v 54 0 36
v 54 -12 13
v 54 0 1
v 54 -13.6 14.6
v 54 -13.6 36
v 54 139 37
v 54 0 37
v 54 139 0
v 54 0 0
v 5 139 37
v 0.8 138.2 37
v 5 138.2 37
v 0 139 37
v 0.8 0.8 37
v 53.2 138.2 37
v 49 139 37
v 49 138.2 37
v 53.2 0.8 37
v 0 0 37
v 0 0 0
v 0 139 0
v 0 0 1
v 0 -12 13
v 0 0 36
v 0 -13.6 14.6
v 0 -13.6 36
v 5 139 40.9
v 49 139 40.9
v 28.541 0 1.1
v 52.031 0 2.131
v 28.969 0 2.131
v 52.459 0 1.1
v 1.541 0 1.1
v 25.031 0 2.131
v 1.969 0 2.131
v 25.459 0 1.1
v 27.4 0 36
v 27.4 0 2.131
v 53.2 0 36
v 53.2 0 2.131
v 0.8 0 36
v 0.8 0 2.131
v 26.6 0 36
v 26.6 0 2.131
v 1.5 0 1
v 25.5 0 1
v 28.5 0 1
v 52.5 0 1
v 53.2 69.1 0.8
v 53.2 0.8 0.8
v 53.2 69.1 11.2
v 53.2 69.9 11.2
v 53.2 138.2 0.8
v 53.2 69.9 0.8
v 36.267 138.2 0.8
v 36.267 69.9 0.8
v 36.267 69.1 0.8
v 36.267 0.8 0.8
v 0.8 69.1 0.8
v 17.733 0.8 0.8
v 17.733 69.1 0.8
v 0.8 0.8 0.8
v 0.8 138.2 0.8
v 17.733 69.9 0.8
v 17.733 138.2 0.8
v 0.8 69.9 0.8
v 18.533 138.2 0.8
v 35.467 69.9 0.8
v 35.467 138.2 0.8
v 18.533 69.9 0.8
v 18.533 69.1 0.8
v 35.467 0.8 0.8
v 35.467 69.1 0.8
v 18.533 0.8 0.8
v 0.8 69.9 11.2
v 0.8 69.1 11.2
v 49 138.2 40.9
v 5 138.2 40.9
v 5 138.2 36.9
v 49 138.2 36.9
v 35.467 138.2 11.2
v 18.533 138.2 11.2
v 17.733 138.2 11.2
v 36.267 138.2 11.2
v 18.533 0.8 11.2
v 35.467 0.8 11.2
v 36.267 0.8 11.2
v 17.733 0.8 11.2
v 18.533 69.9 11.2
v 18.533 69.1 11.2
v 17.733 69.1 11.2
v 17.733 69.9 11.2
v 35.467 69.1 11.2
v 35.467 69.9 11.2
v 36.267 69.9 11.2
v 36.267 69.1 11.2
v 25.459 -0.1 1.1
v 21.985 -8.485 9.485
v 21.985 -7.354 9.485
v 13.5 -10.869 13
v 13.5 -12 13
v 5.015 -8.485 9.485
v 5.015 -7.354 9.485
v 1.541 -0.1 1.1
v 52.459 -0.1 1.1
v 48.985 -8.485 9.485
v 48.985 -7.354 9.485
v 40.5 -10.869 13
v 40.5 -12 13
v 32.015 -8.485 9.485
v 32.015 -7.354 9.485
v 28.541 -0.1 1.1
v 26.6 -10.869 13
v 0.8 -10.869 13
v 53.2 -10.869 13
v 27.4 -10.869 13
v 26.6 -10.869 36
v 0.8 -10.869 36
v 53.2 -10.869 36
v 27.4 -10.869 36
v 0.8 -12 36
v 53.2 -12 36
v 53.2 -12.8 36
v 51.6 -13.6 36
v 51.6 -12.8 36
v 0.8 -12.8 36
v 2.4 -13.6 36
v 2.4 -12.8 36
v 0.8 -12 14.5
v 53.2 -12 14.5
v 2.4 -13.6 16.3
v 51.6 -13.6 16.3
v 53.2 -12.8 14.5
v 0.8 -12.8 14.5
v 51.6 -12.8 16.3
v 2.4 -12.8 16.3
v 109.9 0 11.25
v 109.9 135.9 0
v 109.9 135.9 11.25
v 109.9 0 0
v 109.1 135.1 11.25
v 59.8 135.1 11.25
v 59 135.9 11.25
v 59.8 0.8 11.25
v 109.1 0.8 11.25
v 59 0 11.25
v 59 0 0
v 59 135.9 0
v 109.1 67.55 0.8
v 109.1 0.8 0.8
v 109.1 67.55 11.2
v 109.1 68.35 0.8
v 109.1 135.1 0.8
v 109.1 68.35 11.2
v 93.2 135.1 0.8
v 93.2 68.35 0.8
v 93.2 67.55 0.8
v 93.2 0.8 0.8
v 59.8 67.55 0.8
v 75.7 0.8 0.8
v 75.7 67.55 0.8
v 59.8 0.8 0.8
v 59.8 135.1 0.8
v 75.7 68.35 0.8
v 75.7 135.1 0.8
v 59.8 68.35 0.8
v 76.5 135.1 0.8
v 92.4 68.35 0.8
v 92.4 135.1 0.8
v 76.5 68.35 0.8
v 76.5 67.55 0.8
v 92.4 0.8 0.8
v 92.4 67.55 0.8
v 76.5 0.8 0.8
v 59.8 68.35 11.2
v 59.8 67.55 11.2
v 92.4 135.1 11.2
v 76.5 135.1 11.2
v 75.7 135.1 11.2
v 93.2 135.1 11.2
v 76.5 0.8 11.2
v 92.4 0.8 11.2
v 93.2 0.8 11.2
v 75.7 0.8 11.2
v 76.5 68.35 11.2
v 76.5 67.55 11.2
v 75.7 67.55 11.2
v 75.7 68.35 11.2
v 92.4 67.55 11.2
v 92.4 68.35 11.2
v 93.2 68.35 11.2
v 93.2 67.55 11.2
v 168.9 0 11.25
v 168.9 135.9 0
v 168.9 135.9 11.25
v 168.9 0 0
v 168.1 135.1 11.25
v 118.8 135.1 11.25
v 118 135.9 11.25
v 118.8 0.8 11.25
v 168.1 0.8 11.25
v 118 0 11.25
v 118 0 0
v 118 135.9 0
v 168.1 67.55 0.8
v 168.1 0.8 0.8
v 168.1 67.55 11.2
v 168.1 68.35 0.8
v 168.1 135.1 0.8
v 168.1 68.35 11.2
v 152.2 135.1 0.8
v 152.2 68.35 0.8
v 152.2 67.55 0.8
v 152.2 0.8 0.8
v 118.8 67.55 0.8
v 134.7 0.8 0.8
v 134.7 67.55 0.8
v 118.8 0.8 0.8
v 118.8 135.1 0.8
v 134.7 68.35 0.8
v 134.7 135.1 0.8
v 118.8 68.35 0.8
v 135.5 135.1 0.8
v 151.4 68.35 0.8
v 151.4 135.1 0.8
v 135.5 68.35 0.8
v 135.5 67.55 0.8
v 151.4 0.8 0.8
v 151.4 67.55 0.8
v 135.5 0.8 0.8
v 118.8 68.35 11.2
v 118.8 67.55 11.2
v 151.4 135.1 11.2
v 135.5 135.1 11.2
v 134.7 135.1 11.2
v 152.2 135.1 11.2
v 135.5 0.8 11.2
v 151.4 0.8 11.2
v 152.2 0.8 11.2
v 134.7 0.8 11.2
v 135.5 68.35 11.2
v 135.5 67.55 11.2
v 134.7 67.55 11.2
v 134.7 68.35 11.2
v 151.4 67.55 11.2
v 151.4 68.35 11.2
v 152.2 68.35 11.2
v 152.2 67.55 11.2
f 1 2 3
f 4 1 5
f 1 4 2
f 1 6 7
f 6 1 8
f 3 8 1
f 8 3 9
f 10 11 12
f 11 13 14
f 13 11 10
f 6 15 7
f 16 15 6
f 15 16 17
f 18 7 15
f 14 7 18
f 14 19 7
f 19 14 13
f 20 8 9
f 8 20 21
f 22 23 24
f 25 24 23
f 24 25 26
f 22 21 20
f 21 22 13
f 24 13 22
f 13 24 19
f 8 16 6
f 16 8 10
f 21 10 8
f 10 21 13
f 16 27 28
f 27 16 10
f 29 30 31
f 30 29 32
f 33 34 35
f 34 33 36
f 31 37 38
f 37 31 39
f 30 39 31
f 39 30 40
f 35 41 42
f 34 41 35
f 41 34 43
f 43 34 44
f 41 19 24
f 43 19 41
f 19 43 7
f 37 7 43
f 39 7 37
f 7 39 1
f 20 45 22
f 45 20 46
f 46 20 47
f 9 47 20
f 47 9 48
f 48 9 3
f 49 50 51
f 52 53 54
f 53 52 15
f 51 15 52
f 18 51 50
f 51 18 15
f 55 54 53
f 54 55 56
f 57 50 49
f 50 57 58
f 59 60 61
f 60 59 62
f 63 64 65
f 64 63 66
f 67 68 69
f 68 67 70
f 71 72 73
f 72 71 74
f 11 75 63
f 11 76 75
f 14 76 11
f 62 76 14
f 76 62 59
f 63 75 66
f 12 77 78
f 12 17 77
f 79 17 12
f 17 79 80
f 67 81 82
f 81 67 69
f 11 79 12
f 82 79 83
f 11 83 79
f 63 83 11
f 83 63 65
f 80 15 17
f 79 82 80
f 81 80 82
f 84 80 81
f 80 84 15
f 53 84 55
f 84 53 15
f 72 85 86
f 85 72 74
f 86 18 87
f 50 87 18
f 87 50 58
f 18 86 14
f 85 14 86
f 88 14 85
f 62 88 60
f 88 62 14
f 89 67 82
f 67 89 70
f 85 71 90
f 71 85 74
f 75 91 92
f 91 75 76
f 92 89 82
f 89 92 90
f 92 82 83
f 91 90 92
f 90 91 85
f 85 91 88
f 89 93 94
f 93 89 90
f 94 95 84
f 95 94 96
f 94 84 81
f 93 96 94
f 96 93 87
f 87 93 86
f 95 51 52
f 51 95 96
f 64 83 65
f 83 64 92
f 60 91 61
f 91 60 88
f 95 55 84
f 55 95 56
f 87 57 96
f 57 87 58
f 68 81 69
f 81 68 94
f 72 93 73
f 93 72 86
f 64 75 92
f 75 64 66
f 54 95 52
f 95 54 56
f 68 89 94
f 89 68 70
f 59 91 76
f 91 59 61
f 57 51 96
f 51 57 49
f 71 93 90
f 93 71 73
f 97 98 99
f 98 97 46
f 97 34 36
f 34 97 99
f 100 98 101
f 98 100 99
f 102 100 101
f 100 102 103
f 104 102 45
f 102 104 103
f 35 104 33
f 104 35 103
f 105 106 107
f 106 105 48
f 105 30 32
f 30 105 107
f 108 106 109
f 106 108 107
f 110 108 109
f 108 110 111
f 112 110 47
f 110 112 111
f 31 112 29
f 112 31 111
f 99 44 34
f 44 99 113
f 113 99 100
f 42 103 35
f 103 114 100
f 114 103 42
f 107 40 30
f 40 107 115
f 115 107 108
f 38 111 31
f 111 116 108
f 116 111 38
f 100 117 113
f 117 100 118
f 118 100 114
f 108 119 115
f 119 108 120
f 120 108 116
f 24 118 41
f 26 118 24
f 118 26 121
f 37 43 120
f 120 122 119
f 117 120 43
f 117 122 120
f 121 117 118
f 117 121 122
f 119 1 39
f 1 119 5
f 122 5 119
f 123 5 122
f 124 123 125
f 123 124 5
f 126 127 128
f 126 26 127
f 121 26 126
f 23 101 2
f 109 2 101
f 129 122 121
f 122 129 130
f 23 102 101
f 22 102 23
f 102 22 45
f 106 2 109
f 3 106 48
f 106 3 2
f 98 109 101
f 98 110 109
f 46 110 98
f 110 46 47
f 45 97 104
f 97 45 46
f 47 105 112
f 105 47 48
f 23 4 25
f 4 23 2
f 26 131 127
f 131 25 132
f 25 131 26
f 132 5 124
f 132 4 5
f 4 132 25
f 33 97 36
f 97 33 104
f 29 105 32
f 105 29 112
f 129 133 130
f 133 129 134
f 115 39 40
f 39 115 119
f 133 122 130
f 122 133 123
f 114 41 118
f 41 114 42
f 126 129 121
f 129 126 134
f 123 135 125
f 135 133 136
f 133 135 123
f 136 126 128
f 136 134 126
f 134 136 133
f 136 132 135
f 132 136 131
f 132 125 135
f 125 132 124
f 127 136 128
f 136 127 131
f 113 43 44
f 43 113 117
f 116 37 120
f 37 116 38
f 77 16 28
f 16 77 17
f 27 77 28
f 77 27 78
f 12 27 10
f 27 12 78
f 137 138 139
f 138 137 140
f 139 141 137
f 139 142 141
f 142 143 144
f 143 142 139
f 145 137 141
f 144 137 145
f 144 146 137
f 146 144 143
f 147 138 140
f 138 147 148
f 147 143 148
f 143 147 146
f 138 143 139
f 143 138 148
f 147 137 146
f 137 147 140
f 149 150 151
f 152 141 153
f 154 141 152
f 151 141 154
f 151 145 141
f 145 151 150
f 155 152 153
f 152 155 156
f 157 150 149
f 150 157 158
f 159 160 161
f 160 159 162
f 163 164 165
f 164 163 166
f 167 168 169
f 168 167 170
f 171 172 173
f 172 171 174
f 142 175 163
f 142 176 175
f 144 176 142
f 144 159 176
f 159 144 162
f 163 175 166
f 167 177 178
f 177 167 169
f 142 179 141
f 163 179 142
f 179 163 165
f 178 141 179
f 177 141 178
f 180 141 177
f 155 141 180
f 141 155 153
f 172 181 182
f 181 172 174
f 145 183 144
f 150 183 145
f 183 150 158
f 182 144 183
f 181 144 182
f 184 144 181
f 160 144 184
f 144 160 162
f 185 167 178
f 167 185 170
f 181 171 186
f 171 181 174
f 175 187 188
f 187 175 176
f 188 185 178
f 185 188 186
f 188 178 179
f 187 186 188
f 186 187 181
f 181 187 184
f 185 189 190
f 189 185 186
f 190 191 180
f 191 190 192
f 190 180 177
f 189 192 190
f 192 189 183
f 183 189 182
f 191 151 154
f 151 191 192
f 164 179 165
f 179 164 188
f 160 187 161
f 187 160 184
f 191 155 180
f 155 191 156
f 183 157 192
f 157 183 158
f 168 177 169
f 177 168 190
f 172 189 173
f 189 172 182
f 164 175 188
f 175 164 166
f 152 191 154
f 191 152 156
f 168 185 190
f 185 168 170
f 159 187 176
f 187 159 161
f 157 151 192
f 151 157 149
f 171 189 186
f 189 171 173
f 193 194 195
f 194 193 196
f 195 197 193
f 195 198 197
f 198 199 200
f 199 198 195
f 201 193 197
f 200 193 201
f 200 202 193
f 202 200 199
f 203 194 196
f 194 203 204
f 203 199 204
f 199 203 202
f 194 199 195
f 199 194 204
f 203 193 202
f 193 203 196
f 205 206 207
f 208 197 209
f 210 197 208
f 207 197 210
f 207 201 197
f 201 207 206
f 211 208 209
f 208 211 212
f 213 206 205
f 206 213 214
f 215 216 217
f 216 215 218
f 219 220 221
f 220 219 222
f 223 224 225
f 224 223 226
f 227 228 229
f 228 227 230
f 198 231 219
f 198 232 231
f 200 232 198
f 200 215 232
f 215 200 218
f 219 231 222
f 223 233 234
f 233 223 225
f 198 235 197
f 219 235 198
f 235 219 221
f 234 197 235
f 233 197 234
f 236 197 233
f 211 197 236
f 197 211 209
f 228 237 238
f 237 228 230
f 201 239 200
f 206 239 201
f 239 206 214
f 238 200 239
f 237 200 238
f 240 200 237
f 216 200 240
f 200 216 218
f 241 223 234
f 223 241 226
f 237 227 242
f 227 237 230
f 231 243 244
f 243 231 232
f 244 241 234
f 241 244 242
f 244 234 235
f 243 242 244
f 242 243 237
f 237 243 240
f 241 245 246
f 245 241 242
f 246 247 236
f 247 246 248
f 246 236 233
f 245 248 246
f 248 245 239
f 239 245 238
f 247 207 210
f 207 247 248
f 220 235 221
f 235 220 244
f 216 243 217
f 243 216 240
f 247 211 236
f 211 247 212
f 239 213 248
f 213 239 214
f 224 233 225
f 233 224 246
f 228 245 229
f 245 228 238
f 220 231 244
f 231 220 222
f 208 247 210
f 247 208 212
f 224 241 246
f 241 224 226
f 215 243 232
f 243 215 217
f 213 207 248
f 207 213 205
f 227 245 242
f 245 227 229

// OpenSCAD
/* [dimensions] */
// width of drawer
width = 54;
// height of drawer
height = 37;
// depth of drawer without grip
length = 139;
// depth of grip
grip_depth = 12;
// height of the overhanging part of the grip
grip_height = 12;
// height of the vertical front
grip_frontheight = 23;
// distance between upper rim and grip
grip_downshift = 1;
// diameter of the holes in the grip
griphole_diameter = 24;
// thickness of all walls
wall_thickness = 0.8;
// vert. dist. rim of drawer and rim of inlay
compartment_wall_topdistance = 1;
// width of holder on back-wall
backholder_width=44;
// height of holder on back-wall
backholder_height=4;
// space for moving parts
sfm = 0.75;

/* [organization] */
// number of rows (over length)
rows = 2;
// number of columns
columns = 3;
// number of shelves (including the drawer)
layers=3;

/* [printing] */
// distance between objects
print_distance = 5;
// layout for printing
print_layout=1;
// print the drawer
print_drawer=1; // [0:no, 1:yes]
// number of inlay-shelves to print
print_inlays=2; 

/* [Hidden] */
debug_flag=false;
tol = 0.1;

/* Raaco 150-0 Drawer:
width = 54;
height = 37;
length = 139;
grip_depth = 12;
grip_height = 12;
grip_frontheight = 23;
grip_downshift = 1;
griphole_diameter = 24;
*/

/* Powerfix Kleinteile-Magazin:
width = 68;
height = 36;
length = 118;
grip_depth = 8;
grip_height = 8;
grip_frontheight = 26;
grip_downshift = 1;
griphole_diameter = 16;
*/

//compartment_wall_height = 17.5;
compartment_wall_height = (height-compartment_wall_topdistance)/layers;
a = atan2(grip_depth,grip_height);
// echo(a);

rotate(0,0,-90)
{
    if (print_drawer)
    {
        Drawer();
    }
    if (print_inlays)
    {
        for (layer=[1:print_inlays])
        {
            translate(
            print_drawer ?
                print_layout
                ?
                    [(width+print_distance)*layer,0,0]
                :
                    [(wall_thickness+sfm),wall_thickness+sfm,(compartment_wall_height+sfm)*layer]
            :
                [0,0,0]
            )
                InnerBox();
        }
    }
}

module GripSidewall(ext,h)
{
    linear_extrude(height=h)
    {
        polygon(
        [
            [0,-ext*wall_thickness],
            [0,grip_depth],
            [grip_height+grip_frontheight,grip_depth],
            [grip_frontheight-ext*wall_thickness*tan(90-a),-ext*wall_thickness]
        ]);
    }
}

module LabelHolder()
{
    difference()
    {
        GripSidewall(2,width);
        translate([-tol,0,-tol])
            cube([grip_frontheight+grip_height,grip_depth+2*wall_thickness+tol,width+2*tol]);
        translate([-tol,-wall_thickness,wall_thickness])
            cube([grip_frontheight-2*wall_thickness+2*tol,grip_depth+2*wall_thickness+tol,width-2*wall_thickness]);
        translate([-tol,-2*wall_thickness-tol,3*wall_thickness])
            cube([grip_frontheight-4*wall_thickness,wall_thickness+2*tol,width-6*wall_thickness]);
    }
}

module Grip()
{
    ngripholes = round((width-2*wall_thickness)/(griphole_diameter+wall_thickness)-0.5);
    griphole_distance=width/ngripholes;
    difference()
    {
        linear_extrude(height=width)
        {
            polygon(
            [
                [0,0],
                [0,wall_thickness/cos(a)],
                [grip_frontheight,wall_thickness/cos(a)],
                [grip_height+grip_frontheight-wall_thickness/sin(a),grip_depth],
                [grip_height+grip_frontheight,grip_depth],
                [grip_frontheight,0]
            
            ]);
        }
        for (i=[0:ngripholes-1])
        {
            //x = griphole_diameter/2+wall_thickness + i * griphole_distance;
            x = griphole_distance/2 + i * griphole_distance;
            translate([grip_height+grip_frontheight,grip_depth,x])
                rotate([90,0,0])
                    translate([0,0,-tol])
                    cylinder(r=griphole_diameter/2, h=grip_depth+2*wall_thickness+tol, $fn=8);
                // sphere(r=griphole_diameter/2);
        }
    }
    /*
    */
    translate([0,0,0])
        LabelHolder();
    
    for (x=[0,,width-wall_thickness])
        translate([0,0,x])
            GripSidewall(2,wall_thickness);
    for (i=[0:ngripholes-2])
    {
        x = griphole_distance + i * griphole_distance;
        translate([0,0,x-wall_thickness/2])
            GripSidewall(0,wall_thickness);
    }
}

module Drawer()
{
    Box(width,length,height,wall_thickness);
    translate([(width-backholder_width)/2,length-wall_thickness,height-tol])
        cube([backholder_width,wall_thickness,backholder_height]);
    translate([0,-grip_depth,height-grip_downshift])
        rotate([0,90,0])
            Grip();
}

module InnerBox()
{
    Box(width-2*(sfm+wall_thickness),
        length-2*(sfm+wall_thickness),
        compartment_wall_height-sfm,
        wall_thickness);
}

module Box(width,length,height,wall_thickness)
{
    difference()
    {
        cube([width,length,height]);
        translate([wall_thickness,wall_thickness,wall_thickness])
            cube([width-(2*wall_thickness),length-(2*wall_thickness),height-wall_thickness+tol]);
    }
    compartment_depth = ((length-wall_thickness)/rows);
    compartment_width = ((width-wall_thickness)/columns);
    inner_compartment_depth = compartment_depth - wall_thickness;
    inner_compartment_width = compartment_width - wall_thickness;
    echo(str("inner compartment width: ", inner_compartment_width, 
            "; inner compartment length: ", inner_compartment_depth,
            "; inner compartment height: ", compartment_wall_height - wall_thickness
    ));
    if (debug_flag)
    {
        for (i=[0:rows-1])
        {
            for (j=[0:columns-1])
                translate([j*compartment_width+wall_thickness,i*compartment_depth+wall_thickness,compartment_wall_height])
                    #cube([inner_compartment_width,inner_compartment_depth,1]);
        }
    }
    
    if (rows > 1)
        for (i=[1:rows-1])
        {
            y = i * compartment_depth;
            translate([wall_thickness/2,y,wall_thickness/2])
                cube([width-wall_thickness,wall_thickness,compartment_wall_height-wall_thickness*1.5]);
        }
    if (columns > 1)
        for (i=[1:columns-1])
        {
            x = i * compartment_width;
            translate([x,wall_thickness/2,wall_thickness/2])
                cube([wall_thickness,length-wall_thickness,compartment_wall_height-wall_thickness*1.5]);
        }
}
